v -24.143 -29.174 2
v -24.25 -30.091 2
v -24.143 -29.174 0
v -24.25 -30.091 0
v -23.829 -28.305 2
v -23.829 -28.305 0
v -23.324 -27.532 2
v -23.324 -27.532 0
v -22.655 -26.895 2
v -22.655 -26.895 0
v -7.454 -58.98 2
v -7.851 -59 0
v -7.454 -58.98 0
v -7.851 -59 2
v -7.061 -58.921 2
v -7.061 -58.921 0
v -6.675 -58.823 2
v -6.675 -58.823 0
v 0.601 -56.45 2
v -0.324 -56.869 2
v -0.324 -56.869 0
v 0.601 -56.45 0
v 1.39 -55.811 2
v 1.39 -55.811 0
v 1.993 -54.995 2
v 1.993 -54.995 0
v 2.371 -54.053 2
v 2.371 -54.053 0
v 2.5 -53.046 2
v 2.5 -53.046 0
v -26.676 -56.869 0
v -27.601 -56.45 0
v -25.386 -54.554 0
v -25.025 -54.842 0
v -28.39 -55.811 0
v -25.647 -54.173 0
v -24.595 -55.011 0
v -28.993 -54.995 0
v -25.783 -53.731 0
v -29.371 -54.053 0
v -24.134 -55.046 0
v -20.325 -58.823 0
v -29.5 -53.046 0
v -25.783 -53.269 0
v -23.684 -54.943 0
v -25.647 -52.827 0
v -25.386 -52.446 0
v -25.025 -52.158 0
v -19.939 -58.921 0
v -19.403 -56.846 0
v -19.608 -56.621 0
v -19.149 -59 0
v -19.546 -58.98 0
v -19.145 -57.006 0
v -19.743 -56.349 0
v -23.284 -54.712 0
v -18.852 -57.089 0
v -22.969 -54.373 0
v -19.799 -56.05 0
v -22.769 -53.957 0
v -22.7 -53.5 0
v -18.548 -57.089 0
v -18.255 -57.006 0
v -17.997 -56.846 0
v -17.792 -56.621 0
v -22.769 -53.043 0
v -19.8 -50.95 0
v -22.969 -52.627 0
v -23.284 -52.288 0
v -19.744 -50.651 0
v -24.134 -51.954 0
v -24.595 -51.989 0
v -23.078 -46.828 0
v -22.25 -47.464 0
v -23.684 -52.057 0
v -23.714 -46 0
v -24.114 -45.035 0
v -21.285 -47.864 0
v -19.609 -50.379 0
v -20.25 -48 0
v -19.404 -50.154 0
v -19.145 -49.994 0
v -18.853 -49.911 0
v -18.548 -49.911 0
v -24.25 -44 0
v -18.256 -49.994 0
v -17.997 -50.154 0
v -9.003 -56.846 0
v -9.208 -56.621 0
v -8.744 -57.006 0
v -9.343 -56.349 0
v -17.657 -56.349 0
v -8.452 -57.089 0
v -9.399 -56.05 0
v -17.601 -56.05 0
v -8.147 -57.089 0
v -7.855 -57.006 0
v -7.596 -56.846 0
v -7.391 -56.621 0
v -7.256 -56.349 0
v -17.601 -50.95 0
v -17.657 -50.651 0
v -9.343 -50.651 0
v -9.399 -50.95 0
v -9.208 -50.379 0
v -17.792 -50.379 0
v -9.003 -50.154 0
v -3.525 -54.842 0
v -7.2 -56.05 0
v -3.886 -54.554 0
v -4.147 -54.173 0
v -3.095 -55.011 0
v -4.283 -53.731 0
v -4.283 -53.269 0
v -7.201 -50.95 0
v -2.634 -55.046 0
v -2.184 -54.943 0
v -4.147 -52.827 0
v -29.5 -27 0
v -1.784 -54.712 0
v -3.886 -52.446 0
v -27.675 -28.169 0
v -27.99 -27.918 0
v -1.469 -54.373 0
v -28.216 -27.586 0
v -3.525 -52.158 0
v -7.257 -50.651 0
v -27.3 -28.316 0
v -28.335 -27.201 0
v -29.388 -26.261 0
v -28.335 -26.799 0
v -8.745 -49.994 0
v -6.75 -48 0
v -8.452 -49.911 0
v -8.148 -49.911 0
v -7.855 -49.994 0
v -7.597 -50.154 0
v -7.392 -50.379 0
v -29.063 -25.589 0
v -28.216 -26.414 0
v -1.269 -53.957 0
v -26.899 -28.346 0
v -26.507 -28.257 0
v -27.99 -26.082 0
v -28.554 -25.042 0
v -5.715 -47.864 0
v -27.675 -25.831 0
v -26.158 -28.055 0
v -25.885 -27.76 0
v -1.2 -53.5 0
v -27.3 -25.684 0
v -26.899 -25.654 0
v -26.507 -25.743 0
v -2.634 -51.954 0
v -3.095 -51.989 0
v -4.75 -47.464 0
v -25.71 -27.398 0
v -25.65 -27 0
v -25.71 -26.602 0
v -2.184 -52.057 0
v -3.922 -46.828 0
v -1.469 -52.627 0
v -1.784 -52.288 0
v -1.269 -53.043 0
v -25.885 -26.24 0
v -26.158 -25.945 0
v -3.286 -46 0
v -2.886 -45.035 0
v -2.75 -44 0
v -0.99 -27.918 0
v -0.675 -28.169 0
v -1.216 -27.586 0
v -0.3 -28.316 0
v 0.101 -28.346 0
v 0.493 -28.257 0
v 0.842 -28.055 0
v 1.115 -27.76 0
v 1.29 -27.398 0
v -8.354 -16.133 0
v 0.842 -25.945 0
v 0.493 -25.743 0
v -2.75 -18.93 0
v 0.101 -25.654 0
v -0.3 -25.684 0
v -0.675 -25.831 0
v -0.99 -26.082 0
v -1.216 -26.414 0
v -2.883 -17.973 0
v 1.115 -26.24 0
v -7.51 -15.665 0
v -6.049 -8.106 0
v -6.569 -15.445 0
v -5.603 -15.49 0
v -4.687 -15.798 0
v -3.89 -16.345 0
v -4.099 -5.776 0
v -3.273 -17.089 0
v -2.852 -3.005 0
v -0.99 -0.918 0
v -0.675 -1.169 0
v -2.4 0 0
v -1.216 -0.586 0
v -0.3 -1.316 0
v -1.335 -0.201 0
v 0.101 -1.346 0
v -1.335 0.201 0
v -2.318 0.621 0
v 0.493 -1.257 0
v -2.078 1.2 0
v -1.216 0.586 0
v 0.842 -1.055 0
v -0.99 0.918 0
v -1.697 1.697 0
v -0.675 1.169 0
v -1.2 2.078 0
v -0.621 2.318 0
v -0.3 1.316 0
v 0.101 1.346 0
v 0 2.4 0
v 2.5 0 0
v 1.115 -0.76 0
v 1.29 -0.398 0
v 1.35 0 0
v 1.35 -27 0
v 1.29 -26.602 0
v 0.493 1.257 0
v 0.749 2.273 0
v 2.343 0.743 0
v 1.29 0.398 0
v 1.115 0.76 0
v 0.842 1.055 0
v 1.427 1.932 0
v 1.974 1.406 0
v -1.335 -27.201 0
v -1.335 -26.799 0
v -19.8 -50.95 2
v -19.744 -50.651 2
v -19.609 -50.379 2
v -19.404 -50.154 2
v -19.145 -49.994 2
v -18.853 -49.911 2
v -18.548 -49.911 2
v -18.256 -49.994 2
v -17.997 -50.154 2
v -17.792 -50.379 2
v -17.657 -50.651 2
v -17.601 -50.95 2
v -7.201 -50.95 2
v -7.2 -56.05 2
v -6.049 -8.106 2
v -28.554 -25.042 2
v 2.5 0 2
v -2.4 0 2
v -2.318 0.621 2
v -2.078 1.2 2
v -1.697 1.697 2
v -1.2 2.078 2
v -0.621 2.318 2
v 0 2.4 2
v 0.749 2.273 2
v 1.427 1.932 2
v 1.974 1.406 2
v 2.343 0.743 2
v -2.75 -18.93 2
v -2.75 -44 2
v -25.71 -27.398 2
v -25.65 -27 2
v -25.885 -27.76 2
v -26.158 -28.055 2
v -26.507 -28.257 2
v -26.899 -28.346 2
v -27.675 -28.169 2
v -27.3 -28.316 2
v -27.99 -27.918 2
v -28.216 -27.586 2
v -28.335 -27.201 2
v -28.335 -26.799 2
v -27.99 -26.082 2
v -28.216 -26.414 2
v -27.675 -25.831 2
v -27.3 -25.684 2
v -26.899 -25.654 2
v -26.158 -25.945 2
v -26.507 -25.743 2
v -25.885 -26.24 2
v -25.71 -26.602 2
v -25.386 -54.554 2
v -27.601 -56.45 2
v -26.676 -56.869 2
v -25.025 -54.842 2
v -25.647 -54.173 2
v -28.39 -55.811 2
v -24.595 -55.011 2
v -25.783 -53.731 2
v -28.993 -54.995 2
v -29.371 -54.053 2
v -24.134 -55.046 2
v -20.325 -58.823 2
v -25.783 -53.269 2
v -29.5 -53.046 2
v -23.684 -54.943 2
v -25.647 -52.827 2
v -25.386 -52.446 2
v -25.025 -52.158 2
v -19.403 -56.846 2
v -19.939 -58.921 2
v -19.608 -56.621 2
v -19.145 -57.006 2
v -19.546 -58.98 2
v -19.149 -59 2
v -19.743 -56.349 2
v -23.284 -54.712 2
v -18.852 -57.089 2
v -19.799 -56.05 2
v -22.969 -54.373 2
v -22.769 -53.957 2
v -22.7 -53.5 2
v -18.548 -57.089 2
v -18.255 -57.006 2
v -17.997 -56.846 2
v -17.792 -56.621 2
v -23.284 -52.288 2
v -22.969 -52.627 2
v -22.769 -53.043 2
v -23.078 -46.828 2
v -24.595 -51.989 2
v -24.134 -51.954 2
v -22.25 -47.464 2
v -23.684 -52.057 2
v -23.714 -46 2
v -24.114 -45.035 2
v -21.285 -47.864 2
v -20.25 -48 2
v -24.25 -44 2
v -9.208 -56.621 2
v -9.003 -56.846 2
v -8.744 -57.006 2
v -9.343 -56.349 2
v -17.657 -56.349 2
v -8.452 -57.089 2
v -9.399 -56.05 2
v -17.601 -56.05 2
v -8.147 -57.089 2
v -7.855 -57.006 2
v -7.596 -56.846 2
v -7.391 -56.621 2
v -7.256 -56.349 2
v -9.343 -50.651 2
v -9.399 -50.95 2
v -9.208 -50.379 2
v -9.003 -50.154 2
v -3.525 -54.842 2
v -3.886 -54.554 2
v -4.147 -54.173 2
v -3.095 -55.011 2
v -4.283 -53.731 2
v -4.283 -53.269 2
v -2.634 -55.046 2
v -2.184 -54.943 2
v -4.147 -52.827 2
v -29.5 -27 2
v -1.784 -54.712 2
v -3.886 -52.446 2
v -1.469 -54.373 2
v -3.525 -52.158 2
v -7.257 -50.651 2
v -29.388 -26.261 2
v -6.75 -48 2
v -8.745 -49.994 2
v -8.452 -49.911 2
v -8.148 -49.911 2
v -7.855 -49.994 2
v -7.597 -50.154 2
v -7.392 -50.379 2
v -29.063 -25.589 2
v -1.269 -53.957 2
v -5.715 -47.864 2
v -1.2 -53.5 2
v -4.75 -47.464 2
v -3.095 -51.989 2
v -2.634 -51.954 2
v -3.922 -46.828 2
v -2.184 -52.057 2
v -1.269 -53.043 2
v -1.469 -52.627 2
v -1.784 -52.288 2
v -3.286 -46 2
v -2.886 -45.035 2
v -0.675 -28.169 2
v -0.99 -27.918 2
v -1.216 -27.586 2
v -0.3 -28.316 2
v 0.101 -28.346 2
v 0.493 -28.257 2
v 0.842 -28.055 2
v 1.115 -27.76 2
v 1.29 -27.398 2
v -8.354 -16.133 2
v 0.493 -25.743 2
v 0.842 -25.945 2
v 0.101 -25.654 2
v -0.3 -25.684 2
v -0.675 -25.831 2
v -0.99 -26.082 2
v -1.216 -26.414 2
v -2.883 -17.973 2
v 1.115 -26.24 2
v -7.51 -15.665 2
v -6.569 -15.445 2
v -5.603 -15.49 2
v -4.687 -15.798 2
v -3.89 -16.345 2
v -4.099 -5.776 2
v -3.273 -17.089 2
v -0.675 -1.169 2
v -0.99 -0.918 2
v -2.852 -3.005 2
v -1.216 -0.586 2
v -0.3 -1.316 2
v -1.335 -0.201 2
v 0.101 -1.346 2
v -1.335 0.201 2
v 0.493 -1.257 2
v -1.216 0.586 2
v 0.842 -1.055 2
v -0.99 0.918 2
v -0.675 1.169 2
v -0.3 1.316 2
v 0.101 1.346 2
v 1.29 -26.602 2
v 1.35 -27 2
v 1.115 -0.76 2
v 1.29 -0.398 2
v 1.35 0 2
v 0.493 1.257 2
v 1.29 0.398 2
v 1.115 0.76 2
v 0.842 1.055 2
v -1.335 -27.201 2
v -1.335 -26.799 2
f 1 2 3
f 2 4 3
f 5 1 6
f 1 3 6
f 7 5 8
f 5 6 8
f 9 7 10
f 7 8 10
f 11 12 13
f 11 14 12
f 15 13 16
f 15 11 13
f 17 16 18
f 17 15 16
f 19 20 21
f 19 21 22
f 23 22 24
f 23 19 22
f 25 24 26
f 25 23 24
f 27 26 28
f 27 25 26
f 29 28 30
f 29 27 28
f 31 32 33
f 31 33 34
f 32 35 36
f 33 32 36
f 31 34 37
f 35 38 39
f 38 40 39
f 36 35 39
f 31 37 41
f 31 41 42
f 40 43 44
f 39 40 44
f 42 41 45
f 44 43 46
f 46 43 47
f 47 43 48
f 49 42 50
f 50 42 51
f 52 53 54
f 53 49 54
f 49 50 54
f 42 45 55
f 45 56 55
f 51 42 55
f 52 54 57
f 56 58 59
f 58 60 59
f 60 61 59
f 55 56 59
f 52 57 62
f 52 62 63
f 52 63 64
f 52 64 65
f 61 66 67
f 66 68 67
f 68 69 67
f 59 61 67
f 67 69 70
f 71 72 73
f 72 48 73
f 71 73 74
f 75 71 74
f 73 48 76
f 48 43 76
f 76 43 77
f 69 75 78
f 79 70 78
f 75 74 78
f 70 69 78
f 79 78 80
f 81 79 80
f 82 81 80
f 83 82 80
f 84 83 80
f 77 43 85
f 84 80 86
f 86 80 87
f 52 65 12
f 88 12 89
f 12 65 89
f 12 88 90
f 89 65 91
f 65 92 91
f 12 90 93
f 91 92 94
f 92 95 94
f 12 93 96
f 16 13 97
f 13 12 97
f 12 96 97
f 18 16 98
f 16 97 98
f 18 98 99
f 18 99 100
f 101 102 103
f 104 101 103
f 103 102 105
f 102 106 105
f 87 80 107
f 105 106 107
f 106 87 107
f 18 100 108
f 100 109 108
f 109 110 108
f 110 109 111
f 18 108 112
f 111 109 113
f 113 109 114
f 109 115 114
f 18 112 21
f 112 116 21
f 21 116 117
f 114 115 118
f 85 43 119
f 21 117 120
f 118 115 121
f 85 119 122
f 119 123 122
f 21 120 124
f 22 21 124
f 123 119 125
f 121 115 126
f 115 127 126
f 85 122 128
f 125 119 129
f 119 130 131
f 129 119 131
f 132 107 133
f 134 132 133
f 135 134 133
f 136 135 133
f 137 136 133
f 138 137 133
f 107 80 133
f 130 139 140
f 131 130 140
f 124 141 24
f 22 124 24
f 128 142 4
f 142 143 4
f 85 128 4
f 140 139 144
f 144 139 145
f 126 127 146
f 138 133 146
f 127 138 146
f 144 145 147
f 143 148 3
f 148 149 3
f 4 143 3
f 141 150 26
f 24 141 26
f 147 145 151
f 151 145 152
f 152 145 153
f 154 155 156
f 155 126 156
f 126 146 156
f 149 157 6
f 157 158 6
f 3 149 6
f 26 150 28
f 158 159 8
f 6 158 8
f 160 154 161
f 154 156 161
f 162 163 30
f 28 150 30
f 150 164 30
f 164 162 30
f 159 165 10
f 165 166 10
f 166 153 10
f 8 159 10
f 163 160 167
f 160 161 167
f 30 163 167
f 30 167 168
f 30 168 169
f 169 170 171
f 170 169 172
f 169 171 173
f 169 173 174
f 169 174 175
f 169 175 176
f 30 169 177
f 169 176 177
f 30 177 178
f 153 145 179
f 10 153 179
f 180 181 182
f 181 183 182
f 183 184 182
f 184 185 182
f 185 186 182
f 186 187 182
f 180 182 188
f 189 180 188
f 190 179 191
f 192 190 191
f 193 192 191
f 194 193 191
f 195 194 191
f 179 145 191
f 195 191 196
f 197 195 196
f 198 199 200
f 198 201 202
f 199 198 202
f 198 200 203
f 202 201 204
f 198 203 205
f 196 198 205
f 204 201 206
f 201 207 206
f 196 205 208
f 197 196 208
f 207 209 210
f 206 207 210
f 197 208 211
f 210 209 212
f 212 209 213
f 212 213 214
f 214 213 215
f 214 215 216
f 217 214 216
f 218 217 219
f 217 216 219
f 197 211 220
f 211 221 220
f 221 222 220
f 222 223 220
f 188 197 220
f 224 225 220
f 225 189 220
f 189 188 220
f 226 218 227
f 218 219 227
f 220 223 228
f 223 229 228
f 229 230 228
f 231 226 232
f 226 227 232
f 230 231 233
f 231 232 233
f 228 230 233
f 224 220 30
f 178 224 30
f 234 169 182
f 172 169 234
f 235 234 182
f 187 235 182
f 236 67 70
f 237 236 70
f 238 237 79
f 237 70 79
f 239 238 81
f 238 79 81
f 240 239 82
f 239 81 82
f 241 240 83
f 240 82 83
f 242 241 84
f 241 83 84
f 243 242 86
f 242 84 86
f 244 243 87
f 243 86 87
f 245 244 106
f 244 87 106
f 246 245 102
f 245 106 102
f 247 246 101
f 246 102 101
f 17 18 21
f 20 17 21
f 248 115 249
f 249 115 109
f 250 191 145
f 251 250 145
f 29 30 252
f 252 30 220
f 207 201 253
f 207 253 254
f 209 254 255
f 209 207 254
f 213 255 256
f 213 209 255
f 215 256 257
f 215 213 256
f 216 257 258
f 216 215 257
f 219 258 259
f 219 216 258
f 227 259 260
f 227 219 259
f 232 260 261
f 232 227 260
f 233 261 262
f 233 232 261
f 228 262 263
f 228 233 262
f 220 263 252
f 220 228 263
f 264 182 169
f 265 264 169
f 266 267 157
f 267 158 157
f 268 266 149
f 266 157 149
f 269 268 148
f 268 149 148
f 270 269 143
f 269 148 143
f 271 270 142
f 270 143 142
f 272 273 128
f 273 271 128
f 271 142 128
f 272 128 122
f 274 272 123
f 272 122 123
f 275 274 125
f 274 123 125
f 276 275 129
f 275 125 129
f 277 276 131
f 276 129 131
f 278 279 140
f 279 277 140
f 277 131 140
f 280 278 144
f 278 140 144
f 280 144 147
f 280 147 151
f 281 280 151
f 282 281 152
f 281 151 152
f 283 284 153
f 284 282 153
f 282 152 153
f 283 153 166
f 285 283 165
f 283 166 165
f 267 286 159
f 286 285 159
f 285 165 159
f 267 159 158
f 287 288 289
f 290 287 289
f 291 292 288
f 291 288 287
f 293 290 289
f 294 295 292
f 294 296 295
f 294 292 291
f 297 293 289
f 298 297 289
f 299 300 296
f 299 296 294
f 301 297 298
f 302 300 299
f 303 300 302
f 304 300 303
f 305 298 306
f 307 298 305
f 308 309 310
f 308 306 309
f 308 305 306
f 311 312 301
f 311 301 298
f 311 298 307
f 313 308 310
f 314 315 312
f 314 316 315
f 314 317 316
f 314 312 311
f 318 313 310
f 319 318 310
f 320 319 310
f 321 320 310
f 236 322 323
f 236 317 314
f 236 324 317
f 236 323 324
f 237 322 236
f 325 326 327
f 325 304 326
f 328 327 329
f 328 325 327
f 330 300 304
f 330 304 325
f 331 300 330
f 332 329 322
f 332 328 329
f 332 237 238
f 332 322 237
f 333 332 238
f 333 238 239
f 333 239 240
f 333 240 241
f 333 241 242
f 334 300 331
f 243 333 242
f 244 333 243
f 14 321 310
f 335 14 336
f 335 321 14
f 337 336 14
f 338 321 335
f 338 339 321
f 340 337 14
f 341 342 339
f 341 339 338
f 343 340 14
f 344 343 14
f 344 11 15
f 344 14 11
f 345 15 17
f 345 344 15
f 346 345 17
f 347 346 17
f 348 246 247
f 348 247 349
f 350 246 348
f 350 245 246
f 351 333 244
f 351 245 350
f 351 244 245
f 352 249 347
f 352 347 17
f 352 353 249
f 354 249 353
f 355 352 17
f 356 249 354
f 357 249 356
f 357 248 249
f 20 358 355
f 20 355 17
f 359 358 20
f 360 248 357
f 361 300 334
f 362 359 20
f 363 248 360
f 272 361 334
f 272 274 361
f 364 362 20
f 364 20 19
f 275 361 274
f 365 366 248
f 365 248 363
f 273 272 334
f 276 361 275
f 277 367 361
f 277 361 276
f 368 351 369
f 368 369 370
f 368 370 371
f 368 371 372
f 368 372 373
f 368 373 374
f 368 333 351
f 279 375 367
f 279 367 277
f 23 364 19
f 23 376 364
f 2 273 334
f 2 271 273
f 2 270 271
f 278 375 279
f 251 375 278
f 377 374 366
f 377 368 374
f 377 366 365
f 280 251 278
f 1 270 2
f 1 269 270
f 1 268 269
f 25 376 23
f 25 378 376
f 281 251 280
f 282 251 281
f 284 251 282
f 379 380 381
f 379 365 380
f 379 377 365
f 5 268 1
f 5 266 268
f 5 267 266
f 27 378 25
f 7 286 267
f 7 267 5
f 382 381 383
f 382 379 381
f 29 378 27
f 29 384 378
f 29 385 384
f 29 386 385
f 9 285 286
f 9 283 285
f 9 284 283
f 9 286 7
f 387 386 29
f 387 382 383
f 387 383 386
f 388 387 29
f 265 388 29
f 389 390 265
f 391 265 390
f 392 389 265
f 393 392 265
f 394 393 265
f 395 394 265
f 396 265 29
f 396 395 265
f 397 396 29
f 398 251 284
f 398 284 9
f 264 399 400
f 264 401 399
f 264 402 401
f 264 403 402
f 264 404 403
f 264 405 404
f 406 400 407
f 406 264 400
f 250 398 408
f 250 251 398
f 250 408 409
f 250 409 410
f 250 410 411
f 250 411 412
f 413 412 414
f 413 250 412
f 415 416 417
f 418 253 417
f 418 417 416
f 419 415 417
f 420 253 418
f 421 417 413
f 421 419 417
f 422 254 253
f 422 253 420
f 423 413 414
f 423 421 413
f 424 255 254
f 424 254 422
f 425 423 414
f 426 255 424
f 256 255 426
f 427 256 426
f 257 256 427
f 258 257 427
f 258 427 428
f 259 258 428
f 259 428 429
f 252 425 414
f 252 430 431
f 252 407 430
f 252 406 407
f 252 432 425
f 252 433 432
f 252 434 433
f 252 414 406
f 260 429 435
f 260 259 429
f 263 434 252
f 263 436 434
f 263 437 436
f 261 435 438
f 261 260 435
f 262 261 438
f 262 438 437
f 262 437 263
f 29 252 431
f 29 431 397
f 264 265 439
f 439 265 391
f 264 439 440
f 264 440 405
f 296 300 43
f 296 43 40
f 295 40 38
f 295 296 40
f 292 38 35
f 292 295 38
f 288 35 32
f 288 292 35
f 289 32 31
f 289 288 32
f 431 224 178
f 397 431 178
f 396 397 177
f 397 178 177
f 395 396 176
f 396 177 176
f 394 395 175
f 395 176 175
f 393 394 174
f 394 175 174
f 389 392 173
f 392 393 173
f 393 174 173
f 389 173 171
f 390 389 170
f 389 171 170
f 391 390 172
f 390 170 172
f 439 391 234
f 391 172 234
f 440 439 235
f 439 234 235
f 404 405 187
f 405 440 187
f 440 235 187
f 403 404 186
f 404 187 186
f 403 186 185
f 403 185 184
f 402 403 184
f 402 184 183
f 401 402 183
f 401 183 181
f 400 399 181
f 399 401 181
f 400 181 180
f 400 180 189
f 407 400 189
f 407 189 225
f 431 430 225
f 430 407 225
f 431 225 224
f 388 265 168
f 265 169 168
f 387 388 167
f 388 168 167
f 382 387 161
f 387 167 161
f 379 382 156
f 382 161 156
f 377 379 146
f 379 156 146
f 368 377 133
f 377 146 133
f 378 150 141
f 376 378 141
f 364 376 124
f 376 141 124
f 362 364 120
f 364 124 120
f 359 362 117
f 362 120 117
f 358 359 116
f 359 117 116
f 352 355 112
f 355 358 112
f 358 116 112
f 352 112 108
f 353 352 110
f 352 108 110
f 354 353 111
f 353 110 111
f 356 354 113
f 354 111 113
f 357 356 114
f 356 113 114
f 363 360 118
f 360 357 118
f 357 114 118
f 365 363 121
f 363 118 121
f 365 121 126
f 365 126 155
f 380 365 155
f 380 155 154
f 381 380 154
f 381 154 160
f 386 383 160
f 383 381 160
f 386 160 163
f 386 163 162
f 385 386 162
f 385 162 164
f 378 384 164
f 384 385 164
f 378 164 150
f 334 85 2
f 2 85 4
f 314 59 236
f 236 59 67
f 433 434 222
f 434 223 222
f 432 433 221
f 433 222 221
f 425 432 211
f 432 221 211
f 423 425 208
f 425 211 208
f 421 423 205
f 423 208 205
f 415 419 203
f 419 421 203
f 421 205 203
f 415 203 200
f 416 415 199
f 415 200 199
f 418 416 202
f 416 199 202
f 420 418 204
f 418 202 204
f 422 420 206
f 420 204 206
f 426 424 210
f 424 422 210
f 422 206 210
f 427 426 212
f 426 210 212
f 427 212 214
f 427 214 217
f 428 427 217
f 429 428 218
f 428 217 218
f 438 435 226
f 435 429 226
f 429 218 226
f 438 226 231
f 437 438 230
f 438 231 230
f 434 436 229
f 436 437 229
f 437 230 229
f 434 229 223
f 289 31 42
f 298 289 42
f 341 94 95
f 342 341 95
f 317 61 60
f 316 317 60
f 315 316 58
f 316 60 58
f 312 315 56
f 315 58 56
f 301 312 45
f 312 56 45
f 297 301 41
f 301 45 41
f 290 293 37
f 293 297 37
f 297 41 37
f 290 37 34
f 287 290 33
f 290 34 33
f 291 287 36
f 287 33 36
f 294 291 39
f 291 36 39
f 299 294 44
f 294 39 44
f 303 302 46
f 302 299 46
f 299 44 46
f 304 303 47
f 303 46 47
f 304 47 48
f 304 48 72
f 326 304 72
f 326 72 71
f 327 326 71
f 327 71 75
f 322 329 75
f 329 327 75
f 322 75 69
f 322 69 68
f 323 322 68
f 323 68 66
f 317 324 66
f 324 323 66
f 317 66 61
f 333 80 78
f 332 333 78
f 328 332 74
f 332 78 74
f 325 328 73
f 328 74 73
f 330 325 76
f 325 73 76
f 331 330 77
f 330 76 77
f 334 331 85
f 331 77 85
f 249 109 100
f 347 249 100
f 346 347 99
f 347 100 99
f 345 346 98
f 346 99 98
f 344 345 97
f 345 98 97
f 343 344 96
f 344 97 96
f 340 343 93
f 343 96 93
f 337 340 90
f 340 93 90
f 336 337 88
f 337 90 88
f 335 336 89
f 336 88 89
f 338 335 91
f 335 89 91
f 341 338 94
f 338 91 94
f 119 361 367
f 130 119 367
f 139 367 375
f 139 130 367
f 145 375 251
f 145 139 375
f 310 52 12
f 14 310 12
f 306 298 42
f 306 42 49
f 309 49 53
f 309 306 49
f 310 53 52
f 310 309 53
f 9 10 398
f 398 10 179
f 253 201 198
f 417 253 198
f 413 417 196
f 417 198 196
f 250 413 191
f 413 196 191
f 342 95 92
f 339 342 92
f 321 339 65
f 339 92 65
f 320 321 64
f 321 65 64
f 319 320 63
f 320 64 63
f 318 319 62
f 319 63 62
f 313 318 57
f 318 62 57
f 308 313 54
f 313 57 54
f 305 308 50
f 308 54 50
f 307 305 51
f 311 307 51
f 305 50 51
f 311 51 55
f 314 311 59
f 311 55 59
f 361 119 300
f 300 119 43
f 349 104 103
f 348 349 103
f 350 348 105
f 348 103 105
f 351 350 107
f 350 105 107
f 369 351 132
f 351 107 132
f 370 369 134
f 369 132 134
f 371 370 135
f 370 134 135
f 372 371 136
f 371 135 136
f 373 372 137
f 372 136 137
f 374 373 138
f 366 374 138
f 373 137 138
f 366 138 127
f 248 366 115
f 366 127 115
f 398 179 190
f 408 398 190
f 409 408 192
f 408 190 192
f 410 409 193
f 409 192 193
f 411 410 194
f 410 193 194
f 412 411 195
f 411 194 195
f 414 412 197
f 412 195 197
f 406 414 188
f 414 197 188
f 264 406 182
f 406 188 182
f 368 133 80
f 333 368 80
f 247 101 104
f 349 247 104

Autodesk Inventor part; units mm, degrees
ref_plane "YZ Plane" through (0, 0, 0) normal (1, 0, 0) x (0, 1, 0)
ref_plane "XZ Plane" through (0, 0, 0) normal (0, 1, 0) x (-1, 0, 0)
ref_plane "XY Plane" through (0, 0, 0) normal (0, 0, 1) x (1, 0, 0)
sketch "スケッチ2" plane through (0, 0, 0) normal (0, 0, 1) x (1, 0, 0)
  circle A0 centre (0, 0) radius 1.35
  line L0 (2.5, 0) -> (2.5, -56)
  circle A1 centre (0, 0) radius 2.4
  arc A2 (2.5, 0) -> (0, 2.4) centre (-0.046276, -0.150287) ccw
  arc A3 (0, 2.4) -> (-2.4, 0) centre (0, 0) ccw
  circle A4 centre (0, -27) radius 1.35
  circle A5 centre (-27, -27) radius 1.35
  line L1 (-7.25, -59) -> (2.5, -56)
  line L2 (-19.75, -56) -> (-19.75, -59)
  line L3 (-19.75, -59) -> (-29.5, -56)
  line L4 (-19.75, -59) -> (-7.25, -59)
  line L5 (-29.5, -56) -> (-29.5, -27)
  circle A6 centre (-8.3, -56) radius 1.05
  circle A7 centre (-8.3, -51) radius 1.05
  circle A8 centre (-18.7, -51) radius 1.05
  circle A9 centre (-18.7, -56) radius 1.05
  circle A10 centre (-2.75, -53.5) radius 1.55
  circle A11 centre (-24.25, -53.5) radius 1.55
  line L6 (-6.75, -48) -> (-20.25, -48)
  line L7 (-29.5, -27) -> (-27, -27)
  line L8 (-27, -27) -> (-28.554237, -25.041851)
  circle A12 centre (-27, -27) radius 2.5
  line L9 (-24.25, -44) -> (-24.25, -30.090988)
  line L10 (-2.75, -44) -> (-2.75, -18.930071)
  line L11 (-8.354493, -16.133446) -> (-22.655135, -26.894845)
  arc A13 (-28.554237, -25.041851) -> (-29.5, -27) centre (-27, -27) ccw
  line L12 (-28.554237, -25.041851) -> (-6.048598, -8.106096)
  arc A14 (-6.048598, -8.106096) -> (-2.4, 0) centre (-13.536142, 0.138263) ccw
  line L13 (-7.25, -56) -> (-7.25, -59)
  line L14 (-19.75, -56) -> (-7.25, -56)
  line L15 (-7.25, -56) -> (-7.25, -51)
  line L16 (-7.25, -51) -> (-19.75, -51)
  line L17 (-19.75, -51) -> (-19.75, -56)
  line L18 (-19.8, -50.95) -> (-7.2, -50.95)
  line L19 (-7.2, -50.95) -> (-7.2, -56.05)
  line L20 (-7.2, -56.05) -> (-19.8, -56.05)
  line L21 (-19.8, -56.05) -> (-19.8, -50.95)
  circle A15 centre (-18.7, -51) radius 1.1
  circle A16 centre (-8.3, -51) radius 1.1
  circle A17 centre (-18.7, -56) radius 1.1
  circle A18 centre (-8.3, -56) radius 1.1
  line L22 (2.5, -56) -> (-29.5, -56)
  circle A19 centre (-16, 1) radius 10.5
  arc A20 (-22.655135, -26.894845) -> (-24.25, -30.090988) centre (-20.25, -30.090988) ccw
  arc A21 (-24.25, -44) -> (-20.25, -48) centre (-20.25, -44) ccw
  arc A22 (-6.75, -48) -> (-2.75, -44) centre (-6.75, -44) ccw
  arc A23 (-2.75, -18.930071) -> (-8.354493, -16.133446) centre (-6.25, -18.930071) ccw
  point P0 (-2.75, -48)
  point P1 (-24.25, -48)
  point P2 (-24.25, -28.095)
  point P3 (-2.75, -11.916)
  point P4 (-19.798863, -50.95)
  point P5 (-17.601137, -50.95)
  point P6 (-9.398863, -50.95)
  point P7 (-7.201137, -50.95)
  point P8 (-7.201137, -56.05)
  point P9 (-9.398863, -56.05)
  point P10 (-17.601137, -56.05)
  point P11 (-19.798863, -56.05)
  dimension "d0" = 2.7
  dimension "d1" = 56
  dimension "d2" = 32
  dimension "d3" = 4.8
  dimension "d6" = 2.7
  dimension "d7" = 2.7
  dimension "d10" = 29
  dimension "d11" = 5
  dimension "d13" = 3.1
  dimension "d14" = 2.5
  dimension "d15" = 51.56
  dimension "d18" = 28.166
  dimension "d23" = 0.05
  dimension "d25" = 0.05
  dimension "d27" = 0.05
  dimension "d29" = 0.05
  dimension "d34" = 21
  dimension "d35" = 4
  dimension "d36" = 3.5
sketch "スケッチ2 outline for 押し出し2" plane through (0, 0, 0) normal (0, 0, 1) x (1, 0, 0)
  line L0 (-29.5, -27) -> (-29.5, -56)
  arc A0 (-28.554237, -25.041851) -> (-29.5, -27) centre (-27, -27) ccw
  line L1 (-29.5, -56) -> (-19.75, -59)
  line L2 (-6.048598, -8.106096) -> (-28.554237, -25.041851)
  line L3 (-19.75, -59) -> (-7.25, -59)
  arc A1 (-2.4, 0) -> (-6.048598, -8.106096) centre (-13.536142, 0.138263) cw
  line L4 (-7.25, -59) -> (2.5, -56)
  arc A2 (0, 2.4) -> (-2.4, 0) centre (0, 0) ccw
  line L5 (2.5, -56) -> (2.5, 0)
  arc A3 (2.5, 0) -> (0, 2.4) centre (-0.046276, -0.150287) ccw
  circle A4 centre (-24.25, -53.5) radius 1.55
  line L6 (-6.75, -48) -> (-20.25, -48)
  arc A5 (-2.75, -44) -> (-6.75, -48) centre (-6.75, -44) cw
  line L7 (-2.75, -18.930071) -> (-2.75, -44)
  arc A6 (-8.354493, -16.133446) -> (-2.75, -18.930071) centre (-6.25, -18.930071) cw
  line L8 (-22.655135, -26.894845) -> (-8.354493, -16.133446)
  arc A7 (-24.25, -30.090988) -> (-22.655135, -26.894845) centre (-20.25, -30.090988) cw
  line L9 (-24.25, -44) -> (-24.25, -30.090988)
  arc A8 (-20.25, -48) -> (-24.25, -44) centre (-20.25, -44) cw
  line L10 (-19.798863, -56.05) -> (-19.8, -50.95)
  arc A9 (-17.601137, -56.05) -> (-19.798863, -56.05) centre (-18.7, -56) cw
  line L11 (-9.398863, -56.05) -> (-17.601137, -56.05)
  arc A10 (-7.2, -56.05) -> (-9.398863, -56.05) centre (-8.299432, -55.999405) cw
  line L12 (-7.201137, -50.95) -> (-7.2, -56.05)
  arc A11 (-9.398863, -50.95) -> (-7.201137, -50.95) centre (-8.3, -51) cw
  line L13 (-17.601137, -50.95) -> (-9.398863, -50.95)
  arc A12 (-19.8, -50.95) -> (-17.601137, -50.95) centre (-18.700568, -51.000595) cw
  circle A13 centre (-2.75, -53.5) radius 1.55
  circle A14 centre (-27, -27) radius 1.35
  circle A15 centre (0, -27) radius 1.35
  circle A16 centre (0, 0) radius 1.35
extrude "押し出し2" add sketch "スケッチ2 outline for 押し出し2" along normal blind 2
fillet "フィレット3" radius 4 4 edges at (-29.5, -56, 1) (-19.75, -59, 1) (-7.25, -59, 1) (2.5, -56, 1)
properties part number "UpperArm_vertical_frame_01"
